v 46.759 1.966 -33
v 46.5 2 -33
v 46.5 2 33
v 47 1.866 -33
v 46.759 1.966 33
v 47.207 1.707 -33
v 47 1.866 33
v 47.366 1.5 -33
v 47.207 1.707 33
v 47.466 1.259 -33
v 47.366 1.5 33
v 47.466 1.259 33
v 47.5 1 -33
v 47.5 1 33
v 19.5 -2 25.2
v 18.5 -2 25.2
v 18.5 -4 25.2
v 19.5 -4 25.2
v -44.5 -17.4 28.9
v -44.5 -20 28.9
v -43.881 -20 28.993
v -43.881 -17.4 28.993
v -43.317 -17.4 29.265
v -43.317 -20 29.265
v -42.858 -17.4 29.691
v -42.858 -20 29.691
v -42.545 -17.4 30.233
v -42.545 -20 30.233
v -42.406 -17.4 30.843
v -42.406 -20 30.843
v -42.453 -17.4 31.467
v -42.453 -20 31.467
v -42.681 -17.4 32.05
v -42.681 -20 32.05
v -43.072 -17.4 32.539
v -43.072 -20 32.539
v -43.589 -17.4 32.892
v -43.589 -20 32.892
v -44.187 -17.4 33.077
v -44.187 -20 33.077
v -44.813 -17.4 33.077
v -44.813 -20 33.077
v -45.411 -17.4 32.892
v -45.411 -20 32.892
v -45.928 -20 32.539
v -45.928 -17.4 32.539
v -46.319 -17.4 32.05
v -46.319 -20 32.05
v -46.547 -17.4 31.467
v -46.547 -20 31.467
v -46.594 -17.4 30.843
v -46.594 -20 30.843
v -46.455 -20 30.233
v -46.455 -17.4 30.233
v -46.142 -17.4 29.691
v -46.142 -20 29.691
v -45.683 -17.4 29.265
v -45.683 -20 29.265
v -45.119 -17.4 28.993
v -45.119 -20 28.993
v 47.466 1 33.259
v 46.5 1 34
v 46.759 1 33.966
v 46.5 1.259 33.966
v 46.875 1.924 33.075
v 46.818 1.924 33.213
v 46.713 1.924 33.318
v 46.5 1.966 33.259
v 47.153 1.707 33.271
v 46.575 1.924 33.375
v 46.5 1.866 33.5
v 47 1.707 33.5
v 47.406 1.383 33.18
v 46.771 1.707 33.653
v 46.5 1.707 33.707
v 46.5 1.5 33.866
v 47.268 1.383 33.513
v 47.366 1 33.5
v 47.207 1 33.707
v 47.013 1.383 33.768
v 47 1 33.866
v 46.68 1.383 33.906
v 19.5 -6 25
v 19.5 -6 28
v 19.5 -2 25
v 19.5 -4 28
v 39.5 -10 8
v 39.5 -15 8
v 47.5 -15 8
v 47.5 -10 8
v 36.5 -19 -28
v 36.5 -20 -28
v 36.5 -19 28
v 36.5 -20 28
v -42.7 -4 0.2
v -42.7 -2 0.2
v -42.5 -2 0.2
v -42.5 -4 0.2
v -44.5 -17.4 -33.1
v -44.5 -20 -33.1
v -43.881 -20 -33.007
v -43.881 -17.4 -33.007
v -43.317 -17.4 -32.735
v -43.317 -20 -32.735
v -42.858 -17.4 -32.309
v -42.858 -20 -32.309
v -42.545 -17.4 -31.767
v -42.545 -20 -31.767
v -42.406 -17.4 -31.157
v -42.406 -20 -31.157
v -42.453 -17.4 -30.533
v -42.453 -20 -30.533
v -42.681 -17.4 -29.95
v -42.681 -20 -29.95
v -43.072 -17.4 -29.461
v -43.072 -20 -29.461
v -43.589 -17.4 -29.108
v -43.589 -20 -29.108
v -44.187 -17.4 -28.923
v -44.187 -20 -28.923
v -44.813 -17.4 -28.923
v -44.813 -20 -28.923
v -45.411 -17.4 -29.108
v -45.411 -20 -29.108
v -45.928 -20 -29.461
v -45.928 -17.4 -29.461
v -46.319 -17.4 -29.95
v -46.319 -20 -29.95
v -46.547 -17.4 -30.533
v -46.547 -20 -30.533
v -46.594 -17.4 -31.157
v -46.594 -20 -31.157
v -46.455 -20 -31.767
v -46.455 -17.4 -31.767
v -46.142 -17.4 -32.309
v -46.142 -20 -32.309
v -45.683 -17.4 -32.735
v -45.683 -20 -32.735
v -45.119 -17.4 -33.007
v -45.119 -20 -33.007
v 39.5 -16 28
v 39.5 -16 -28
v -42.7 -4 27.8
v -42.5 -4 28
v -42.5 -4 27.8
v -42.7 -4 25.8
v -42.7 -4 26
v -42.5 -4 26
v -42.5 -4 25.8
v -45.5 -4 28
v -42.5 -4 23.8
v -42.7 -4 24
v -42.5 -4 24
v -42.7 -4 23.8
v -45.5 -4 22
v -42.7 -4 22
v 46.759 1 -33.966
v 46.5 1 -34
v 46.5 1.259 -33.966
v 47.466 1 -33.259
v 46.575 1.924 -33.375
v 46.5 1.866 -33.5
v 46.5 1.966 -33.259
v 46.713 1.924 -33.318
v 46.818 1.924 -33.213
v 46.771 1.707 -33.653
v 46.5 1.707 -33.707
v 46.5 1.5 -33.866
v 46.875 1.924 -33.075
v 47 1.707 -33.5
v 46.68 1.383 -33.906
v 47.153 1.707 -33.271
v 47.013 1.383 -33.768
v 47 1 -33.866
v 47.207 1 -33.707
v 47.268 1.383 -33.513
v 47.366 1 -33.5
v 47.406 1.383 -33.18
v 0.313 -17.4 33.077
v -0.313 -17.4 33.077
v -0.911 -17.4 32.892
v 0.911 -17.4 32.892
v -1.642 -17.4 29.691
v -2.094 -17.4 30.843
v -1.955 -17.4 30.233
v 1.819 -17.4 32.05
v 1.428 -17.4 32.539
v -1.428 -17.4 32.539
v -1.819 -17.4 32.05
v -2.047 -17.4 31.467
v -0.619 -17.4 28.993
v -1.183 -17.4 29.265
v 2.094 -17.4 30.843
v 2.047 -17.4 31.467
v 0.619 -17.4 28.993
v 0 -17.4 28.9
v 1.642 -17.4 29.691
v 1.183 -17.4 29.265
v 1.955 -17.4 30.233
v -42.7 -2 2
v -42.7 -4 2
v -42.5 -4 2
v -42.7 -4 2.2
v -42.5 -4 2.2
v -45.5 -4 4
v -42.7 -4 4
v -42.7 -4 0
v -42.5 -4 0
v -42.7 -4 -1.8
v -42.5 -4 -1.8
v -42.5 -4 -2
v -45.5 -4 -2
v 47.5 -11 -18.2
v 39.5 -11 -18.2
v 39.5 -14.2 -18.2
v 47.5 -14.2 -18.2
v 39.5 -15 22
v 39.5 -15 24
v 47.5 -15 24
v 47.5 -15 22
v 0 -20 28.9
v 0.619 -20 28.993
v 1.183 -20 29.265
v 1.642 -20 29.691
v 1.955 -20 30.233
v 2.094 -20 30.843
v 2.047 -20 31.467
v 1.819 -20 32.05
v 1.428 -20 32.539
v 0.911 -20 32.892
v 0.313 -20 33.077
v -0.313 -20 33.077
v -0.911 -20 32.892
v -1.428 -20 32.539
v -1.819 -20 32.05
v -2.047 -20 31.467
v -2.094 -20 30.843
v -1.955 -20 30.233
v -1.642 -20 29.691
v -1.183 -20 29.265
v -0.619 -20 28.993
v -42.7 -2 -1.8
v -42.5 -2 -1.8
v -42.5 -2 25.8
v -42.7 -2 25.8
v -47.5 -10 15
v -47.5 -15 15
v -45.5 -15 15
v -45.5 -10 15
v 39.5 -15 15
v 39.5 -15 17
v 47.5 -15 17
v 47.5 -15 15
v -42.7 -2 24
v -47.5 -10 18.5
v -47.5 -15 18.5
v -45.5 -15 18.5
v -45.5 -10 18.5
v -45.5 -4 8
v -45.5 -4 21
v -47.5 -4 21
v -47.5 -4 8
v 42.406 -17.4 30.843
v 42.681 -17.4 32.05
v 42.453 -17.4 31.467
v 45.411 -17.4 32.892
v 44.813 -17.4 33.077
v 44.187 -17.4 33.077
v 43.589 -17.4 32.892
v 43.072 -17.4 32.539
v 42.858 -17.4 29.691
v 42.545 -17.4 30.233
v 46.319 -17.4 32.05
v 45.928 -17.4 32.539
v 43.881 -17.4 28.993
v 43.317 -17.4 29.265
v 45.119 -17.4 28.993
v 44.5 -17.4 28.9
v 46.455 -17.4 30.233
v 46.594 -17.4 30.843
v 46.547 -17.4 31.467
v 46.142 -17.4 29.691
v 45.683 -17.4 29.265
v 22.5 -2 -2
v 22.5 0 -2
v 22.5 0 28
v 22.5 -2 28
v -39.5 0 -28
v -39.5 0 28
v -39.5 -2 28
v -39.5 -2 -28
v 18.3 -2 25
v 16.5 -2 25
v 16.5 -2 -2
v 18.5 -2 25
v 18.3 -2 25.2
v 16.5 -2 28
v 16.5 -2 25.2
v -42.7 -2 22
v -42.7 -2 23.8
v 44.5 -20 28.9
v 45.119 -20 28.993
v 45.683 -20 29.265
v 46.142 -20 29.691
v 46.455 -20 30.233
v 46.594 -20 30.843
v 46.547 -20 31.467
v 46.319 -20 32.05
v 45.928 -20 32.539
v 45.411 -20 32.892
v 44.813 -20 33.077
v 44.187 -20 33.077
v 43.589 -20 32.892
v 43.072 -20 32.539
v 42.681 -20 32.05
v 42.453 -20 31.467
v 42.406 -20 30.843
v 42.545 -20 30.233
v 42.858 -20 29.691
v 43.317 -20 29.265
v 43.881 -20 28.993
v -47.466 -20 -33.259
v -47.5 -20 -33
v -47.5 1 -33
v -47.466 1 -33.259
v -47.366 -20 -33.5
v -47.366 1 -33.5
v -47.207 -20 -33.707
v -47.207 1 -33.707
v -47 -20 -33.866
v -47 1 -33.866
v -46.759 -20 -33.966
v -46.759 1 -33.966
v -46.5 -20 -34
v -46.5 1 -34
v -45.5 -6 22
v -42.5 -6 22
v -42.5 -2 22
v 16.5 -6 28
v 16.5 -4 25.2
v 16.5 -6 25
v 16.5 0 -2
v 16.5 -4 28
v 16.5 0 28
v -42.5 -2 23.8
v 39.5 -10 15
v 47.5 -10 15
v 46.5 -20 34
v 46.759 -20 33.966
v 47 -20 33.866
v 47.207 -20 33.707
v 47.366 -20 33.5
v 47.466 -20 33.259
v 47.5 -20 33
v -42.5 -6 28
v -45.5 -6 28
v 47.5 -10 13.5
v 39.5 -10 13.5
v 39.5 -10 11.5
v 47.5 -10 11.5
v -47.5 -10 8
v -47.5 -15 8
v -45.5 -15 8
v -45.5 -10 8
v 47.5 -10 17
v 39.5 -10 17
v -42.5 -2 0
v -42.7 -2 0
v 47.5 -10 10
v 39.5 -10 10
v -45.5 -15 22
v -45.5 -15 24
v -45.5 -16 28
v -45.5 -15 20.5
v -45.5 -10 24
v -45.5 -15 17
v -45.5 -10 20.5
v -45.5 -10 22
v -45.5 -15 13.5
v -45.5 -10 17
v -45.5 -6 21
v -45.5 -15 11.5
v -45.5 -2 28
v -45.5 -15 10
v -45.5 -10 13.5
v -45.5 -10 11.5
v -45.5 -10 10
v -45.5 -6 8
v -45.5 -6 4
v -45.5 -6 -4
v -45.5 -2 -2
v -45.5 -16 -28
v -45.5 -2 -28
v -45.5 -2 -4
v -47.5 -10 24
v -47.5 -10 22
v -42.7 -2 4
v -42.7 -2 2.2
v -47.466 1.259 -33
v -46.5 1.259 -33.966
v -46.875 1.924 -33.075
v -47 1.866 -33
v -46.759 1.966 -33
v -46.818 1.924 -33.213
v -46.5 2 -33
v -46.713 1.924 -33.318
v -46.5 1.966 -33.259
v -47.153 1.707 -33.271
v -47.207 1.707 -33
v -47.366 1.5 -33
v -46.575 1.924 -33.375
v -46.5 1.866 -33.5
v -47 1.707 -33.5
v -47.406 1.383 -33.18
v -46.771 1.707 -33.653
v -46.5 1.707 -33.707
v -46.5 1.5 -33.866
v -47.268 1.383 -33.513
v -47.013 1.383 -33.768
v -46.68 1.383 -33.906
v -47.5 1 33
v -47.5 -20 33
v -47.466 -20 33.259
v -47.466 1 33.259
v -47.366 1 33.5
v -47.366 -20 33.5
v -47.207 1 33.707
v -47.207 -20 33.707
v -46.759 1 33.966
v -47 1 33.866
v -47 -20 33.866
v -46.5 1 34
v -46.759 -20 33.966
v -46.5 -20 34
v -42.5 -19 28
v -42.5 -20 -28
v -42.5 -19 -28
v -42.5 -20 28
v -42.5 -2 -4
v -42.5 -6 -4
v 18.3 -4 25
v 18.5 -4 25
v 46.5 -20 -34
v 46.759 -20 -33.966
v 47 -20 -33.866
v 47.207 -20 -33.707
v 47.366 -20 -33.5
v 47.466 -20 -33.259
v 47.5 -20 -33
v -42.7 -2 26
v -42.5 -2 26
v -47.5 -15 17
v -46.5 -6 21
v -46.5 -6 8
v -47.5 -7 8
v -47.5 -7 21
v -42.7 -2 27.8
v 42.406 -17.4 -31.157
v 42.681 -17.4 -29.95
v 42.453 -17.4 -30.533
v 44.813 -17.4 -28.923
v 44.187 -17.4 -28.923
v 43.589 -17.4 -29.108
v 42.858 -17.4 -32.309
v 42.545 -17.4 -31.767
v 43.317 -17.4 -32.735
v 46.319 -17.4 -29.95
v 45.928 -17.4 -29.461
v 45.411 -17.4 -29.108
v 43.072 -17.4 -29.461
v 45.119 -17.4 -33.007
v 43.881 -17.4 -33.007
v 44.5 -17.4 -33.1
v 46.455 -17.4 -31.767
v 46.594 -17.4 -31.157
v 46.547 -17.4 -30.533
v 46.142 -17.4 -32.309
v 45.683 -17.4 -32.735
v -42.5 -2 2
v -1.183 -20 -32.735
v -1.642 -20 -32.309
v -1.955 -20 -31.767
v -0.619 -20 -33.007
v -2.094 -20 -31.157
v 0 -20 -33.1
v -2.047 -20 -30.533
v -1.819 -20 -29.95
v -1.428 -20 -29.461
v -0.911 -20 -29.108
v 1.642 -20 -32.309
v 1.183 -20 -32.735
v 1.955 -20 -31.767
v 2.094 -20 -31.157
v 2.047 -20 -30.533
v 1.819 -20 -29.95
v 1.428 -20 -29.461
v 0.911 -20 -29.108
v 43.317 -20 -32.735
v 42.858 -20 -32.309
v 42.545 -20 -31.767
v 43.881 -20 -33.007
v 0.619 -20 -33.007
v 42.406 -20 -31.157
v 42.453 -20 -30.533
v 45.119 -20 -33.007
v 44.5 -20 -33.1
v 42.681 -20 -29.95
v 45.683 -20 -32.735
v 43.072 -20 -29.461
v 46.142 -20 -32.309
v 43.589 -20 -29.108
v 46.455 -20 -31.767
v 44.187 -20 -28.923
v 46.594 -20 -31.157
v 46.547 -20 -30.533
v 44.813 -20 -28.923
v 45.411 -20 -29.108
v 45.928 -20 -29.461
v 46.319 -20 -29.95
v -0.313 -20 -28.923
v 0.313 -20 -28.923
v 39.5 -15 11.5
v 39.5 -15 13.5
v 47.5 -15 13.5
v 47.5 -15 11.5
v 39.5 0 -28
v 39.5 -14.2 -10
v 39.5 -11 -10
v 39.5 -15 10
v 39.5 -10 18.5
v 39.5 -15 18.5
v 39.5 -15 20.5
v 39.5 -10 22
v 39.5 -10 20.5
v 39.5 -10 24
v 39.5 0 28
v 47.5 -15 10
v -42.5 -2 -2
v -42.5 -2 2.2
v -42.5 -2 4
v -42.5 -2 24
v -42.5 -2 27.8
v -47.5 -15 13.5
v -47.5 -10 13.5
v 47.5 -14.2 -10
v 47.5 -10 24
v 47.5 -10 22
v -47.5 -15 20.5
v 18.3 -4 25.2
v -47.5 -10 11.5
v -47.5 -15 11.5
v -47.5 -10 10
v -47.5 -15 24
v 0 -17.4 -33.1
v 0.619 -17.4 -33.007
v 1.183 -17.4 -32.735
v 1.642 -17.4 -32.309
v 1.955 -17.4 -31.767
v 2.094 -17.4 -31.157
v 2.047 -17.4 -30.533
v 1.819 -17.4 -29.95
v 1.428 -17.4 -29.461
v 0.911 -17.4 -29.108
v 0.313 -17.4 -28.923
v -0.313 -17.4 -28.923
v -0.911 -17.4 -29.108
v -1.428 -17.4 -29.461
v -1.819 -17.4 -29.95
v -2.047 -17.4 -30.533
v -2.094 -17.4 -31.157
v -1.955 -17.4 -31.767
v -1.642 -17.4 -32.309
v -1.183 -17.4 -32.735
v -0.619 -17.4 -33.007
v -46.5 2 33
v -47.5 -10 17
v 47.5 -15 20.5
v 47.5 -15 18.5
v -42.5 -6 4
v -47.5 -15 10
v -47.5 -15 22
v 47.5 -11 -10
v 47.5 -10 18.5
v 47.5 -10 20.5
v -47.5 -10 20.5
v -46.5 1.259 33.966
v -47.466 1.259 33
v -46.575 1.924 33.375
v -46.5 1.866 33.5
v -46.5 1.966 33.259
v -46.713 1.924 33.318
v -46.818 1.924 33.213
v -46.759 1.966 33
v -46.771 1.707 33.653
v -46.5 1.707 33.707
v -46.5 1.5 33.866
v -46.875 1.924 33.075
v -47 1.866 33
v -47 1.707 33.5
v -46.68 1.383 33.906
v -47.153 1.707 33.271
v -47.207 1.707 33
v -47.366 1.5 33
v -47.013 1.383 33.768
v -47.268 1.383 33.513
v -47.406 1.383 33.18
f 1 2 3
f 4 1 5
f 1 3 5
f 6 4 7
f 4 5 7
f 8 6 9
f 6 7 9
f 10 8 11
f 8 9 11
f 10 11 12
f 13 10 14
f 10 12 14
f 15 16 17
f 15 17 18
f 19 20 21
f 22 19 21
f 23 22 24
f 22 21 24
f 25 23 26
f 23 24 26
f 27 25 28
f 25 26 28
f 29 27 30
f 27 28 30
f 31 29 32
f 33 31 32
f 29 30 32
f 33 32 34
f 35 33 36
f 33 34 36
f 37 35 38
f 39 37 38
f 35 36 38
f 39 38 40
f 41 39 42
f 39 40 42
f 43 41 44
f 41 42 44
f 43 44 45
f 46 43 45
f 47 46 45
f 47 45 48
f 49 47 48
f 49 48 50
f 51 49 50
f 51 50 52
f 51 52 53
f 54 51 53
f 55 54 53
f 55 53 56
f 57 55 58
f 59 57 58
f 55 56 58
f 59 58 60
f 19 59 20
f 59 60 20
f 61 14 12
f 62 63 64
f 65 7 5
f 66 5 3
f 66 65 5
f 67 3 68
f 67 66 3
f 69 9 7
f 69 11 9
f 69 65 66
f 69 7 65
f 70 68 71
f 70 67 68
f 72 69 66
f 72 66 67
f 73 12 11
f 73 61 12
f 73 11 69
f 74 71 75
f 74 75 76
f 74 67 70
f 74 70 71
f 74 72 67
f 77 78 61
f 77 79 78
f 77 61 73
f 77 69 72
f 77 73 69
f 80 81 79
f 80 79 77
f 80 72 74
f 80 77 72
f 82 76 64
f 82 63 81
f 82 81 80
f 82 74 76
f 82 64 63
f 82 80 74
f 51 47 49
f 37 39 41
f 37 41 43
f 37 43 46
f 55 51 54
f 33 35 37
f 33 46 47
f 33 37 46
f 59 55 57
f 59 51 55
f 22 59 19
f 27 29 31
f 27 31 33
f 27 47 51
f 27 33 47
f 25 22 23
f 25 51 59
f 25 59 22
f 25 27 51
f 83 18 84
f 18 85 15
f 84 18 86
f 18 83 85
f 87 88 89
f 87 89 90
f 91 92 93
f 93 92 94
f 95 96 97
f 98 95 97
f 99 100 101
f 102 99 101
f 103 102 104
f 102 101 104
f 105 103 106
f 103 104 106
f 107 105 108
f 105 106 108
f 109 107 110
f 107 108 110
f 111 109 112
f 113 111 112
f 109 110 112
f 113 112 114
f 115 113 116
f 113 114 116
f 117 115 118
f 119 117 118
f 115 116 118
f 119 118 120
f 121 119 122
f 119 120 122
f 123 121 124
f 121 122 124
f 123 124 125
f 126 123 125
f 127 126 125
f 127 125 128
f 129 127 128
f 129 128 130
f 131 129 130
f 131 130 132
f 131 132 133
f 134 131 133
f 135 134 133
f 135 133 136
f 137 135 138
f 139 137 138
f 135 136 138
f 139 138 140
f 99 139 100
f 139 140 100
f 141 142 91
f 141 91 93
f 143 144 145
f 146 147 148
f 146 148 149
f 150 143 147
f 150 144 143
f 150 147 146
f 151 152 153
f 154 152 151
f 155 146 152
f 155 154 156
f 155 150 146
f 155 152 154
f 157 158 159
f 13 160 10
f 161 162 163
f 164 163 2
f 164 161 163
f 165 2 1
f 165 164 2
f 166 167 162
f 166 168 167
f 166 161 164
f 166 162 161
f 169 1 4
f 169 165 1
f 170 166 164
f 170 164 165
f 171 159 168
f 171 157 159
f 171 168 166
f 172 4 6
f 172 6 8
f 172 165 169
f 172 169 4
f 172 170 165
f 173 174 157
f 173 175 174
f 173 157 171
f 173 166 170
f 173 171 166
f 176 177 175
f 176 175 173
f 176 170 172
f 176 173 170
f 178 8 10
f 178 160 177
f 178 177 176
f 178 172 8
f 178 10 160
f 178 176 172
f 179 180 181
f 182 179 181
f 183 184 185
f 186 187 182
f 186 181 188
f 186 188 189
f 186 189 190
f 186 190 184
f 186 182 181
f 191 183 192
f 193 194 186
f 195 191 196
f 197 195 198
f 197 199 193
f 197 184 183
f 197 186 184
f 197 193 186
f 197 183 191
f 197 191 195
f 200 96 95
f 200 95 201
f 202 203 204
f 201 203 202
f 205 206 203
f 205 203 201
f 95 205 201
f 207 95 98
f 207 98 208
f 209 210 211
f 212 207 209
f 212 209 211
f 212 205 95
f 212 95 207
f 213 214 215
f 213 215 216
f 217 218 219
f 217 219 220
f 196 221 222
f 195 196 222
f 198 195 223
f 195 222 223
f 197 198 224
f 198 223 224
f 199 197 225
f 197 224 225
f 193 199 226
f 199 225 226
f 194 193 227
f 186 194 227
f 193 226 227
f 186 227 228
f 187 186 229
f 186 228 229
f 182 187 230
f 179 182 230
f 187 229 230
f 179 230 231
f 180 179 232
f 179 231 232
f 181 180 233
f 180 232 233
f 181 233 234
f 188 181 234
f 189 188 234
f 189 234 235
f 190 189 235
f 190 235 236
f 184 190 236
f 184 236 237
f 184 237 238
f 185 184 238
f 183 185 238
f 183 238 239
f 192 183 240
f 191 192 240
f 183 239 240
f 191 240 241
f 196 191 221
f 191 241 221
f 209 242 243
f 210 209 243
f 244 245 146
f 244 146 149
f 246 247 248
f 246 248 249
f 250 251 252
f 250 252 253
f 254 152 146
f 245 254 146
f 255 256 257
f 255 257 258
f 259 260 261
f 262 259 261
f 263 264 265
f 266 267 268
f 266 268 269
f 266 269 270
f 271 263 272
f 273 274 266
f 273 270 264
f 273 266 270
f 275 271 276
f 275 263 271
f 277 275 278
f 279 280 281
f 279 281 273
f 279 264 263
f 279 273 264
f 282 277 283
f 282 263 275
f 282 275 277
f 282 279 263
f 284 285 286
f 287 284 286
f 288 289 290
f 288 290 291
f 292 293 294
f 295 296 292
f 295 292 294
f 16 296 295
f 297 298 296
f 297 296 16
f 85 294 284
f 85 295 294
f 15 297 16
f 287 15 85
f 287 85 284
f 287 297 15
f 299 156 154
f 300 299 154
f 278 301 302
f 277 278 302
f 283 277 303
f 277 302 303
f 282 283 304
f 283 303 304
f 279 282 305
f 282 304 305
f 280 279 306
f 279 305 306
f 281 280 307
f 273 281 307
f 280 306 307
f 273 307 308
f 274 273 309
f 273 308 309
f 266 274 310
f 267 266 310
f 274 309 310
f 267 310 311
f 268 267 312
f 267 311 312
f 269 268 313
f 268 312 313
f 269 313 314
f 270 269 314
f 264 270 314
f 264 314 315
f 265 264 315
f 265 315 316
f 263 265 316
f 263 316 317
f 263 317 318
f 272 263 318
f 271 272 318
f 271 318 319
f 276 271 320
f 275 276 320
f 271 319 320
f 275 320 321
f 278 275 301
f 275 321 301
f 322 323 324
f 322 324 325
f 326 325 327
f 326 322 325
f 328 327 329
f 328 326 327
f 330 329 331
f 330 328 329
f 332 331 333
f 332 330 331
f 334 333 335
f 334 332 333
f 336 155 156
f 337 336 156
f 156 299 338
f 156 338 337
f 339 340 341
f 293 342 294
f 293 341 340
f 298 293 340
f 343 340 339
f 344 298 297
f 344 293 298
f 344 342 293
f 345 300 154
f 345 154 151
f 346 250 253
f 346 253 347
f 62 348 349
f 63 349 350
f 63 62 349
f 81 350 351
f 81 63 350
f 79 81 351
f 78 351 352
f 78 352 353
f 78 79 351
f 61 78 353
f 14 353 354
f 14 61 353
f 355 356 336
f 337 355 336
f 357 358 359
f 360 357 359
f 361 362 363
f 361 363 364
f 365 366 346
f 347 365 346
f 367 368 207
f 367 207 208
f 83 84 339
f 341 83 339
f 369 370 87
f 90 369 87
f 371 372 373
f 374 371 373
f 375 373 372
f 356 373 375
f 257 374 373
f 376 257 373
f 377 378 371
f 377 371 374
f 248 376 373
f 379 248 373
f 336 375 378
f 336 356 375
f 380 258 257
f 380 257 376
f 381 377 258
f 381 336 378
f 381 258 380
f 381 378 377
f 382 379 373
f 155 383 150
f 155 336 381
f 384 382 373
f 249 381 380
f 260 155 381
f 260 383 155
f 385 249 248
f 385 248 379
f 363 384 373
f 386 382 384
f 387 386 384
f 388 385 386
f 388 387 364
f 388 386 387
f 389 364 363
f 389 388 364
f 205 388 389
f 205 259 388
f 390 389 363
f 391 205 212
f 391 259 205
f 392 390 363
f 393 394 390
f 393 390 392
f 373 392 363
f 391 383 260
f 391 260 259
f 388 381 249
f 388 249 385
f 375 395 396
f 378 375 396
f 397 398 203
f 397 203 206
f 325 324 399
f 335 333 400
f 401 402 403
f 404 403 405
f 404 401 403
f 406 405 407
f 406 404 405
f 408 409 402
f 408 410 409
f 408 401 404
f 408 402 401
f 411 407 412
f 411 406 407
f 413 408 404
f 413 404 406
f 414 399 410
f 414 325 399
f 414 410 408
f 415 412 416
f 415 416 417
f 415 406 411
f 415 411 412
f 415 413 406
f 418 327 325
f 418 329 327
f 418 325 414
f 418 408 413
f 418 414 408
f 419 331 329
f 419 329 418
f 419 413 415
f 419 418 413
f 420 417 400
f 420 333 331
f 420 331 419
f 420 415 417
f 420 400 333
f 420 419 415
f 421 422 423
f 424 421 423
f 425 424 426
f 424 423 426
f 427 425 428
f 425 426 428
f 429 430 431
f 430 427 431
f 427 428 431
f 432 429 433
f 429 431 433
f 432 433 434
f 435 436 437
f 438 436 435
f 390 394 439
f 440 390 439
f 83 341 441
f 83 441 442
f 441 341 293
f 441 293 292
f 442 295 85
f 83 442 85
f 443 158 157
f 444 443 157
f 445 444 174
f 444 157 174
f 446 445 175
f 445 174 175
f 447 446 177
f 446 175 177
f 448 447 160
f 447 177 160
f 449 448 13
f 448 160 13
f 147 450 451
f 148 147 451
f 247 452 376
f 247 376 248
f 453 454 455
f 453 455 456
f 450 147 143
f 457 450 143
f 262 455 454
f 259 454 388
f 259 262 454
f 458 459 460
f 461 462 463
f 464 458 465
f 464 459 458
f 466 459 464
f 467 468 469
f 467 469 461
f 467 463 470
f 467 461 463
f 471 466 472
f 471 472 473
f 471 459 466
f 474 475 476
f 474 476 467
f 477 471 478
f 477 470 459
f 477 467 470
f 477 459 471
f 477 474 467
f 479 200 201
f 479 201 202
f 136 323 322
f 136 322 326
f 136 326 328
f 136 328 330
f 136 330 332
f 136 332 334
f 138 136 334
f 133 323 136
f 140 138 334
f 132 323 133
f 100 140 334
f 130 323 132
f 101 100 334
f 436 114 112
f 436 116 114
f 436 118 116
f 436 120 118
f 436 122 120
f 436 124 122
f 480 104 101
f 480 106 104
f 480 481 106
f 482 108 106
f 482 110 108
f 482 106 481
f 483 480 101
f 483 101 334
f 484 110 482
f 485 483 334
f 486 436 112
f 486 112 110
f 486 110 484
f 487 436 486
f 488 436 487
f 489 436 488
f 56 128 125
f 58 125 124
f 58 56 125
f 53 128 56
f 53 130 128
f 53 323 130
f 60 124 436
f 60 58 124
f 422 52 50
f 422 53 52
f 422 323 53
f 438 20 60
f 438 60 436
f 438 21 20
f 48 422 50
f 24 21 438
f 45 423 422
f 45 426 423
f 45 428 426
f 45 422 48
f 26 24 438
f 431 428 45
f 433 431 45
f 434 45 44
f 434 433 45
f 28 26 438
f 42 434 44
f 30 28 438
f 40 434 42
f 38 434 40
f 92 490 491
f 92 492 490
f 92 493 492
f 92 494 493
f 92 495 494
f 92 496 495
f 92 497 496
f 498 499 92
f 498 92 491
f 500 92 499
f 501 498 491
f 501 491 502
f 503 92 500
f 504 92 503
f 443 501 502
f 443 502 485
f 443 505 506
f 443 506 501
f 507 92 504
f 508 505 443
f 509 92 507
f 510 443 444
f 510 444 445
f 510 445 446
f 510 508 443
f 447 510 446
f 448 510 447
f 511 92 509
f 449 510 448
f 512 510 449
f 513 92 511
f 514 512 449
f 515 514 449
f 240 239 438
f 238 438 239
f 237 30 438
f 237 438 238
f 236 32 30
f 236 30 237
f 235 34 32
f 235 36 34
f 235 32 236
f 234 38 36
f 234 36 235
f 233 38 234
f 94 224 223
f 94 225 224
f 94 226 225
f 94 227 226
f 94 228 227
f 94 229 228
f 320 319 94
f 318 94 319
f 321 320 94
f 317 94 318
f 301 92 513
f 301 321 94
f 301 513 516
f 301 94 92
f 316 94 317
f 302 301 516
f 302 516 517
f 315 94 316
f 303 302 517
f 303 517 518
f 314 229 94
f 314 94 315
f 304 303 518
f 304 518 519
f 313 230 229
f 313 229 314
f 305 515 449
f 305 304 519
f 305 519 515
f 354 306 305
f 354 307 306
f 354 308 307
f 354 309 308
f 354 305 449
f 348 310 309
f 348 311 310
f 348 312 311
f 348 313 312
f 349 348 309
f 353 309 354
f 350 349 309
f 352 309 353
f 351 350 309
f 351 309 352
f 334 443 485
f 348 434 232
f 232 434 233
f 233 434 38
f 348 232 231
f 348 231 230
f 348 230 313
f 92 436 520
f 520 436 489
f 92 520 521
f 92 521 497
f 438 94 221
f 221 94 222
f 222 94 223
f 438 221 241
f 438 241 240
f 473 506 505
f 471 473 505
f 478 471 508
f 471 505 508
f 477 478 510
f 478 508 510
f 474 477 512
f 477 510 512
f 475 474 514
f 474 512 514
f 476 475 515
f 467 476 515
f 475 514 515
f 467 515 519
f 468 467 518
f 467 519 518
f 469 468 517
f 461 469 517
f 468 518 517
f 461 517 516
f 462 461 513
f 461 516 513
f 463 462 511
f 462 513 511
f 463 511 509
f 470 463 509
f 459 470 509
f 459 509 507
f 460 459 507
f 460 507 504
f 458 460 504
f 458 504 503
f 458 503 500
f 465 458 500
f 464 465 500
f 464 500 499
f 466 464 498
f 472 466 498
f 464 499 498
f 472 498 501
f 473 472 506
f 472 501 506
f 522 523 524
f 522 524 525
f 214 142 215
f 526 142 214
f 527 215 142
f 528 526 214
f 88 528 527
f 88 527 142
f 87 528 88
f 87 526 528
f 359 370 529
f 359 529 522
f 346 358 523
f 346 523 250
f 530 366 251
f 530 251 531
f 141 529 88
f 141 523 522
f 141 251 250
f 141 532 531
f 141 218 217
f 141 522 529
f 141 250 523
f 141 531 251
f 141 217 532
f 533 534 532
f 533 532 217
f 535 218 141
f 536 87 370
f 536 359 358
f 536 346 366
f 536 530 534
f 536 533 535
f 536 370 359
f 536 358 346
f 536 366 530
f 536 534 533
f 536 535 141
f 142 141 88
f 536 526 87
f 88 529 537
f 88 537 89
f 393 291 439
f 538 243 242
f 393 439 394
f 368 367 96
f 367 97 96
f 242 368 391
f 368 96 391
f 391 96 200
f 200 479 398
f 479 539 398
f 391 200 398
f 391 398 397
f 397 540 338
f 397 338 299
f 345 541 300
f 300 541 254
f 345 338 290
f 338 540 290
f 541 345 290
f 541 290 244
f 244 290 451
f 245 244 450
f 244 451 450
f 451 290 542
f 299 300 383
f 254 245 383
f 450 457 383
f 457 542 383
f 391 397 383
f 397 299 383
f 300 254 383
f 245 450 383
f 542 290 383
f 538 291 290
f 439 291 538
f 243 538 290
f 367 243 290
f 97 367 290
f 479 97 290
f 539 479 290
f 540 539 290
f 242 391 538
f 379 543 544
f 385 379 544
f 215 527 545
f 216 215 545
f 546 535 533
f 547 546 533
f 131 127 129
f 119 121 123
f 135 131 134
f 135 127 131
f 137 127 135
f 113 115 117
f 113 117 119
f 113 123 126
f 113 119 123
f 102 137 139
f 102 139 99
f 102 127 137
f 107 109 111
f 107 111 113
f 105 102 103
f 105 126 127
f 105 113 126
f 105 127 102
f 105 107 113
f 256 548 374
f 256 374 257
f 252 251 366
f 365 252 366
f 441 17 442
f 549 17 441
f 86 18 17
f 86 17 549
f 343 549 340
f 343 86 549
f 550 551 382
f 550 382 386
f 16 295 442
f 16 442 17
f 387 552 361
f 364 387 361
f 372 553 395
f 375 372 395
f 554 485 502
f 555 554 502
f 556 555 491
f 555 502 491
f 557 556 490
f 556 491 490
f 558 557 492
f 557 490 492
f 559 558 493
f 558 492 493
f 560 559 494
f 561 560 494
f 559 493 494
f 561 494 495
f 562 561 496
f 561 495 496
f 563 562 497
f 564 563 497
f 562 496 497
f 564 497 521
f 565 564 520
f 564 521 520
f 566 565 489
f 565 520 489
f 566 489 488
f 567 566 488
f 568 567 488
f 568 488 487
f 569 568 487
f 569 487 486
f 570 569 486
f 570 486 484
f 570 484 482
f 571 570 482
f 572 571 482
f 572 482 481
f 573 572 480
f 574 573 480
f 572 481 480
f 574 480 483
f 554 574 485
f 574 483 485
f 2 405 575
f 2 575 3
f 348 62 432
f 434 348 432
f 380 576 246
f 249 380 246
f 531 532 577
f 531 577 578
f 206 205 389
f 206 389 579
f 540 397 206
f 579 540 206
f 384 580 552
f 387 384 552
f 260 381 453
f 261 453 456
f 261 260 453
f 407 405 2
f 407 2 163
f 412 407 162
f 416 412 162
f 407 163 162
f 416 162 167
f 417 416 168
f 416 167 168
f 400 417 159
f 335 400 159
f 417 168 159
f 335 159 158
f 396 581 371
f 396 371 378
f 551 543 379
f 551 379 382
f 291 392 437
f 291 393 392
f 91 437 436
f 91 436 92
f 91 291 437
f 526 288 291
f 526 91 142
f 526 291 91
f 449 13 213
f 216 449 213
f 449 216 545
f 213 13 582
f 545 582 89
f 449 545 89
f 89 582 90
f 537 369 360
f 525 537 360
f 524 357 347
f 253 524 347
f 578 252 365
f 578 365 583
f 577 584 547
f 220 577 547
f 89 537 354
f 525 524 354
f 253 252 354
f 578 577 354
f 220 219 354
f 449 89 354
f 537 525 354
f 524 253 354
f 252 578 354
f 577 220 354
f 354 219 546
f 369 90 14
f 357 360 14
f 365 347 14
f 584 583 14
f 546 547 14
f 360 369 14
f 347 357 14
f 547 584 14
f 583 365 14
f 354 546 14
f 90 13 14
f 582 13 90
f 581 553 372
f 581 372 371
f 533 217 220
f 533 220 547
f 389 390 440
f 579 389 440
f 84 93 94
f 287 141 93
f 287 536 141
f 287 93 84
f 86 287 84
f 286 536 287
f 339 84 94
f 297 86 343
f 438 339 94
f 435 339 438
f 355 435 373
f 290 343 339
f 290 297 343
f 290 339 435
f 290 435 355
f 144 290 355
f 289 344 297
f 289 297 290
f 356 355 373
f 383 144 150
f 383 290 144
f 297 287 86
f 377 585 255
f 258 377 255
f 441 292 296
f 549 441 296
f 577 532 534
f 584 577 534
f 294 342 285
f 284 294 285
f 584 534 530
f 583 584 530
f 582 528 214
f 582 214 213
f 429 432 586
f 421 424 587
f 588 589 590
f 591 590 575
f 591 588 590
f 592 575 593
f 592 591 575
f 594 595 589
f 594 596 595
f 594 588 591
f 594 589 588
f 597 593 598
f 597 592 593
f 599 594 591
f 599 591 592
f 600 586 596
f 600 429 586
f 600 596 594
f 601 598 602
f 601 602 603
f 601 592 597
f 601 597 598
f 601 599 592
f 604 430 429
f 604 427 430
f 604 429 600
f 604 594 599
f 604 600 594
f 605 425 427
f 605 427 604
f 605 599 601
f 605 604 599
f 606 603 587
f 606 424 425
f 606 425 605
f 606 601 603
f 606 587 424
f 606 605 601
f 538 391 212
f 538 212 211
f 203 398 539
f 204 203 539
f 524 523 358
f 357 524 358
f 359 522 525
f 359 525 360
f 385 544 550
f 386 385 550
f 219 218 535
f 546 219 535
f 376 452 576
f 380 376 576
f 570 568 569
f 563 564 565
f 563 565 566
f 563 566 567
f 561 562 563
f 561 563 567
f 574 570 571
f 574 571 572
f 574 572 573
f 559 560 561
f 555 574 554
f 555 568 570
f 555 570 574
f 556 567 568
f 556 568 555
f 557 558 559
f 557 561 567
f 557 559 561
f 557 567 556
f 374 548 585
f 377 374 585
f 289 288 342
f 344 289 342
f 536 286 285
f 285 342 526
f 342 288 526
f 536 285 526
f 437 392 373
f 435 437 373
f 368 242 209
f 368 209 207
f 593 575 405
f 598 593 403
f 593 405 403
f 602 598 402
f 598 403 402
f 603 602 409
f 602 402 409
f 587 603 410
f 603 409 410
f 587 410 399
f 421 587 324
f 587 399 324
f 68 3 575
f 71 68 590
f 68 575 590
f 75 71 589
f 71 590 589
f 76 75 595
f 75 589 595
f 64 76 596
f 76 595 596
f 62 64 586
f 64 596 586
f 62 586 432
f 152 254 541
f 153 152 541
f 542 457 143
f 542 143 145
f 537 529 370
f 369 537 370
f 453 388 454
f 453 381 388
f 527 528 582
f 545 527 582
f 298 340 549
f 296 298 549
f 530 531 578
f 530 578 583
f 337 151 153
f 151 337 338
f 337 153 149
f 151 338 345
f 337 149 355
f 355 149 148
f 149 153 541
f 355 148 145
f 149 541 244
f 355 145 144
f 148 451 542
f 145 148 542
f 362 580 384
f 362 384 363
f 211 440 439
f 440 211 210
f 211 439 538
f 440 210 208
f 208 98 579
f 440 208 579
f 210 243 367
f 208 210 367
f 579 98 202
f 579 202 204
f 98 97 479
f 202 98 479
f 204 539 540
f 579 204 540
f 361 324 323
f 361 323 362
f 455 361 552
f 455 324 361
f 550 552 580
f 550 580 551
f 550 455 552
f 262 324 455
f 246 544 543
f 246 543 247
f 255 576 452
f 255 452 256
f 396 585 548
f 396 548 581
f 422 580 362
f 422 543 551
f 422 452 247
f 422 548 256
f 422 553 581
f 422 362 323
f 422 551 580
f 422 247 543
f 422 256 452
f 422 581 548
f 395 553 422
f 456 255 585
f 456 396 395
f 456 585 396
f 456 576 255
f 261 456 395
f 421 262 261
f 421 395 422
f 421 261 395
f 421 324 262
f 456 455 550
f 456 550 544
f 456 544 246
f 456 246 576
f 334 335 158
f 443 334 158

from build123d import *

# Parameters (mm, degrees)
SKETCH_1_W               = 95
SKETCH_1_H               = 68
EXTRUDE_1_DEPTH          = 2
EXTRUDE_2_DEPTH          = 2
EXTRUDE_3_DEPTH          = 2
EXTRUDE_4_DEPTH          = 2
EXTRUDE_5_DEPTH          = 14
SKETCH_7_W               = 6
SKETCH_7_H               = 2
EXTRUDE_6_DEPTH          = 3
SKETCH_8_W               = 3
SKETCH_8_H               = 2
EXTRUDE_7_DEPTH          = 4
SKETCH_9_W               = 0.2
SKETCH_9_H               = 1.8
EXTRUDE_8_DEPTH          = 2
SKETCH_13_W              = 3
SKETCH_13_H              = 56
EXTRUDE_10_DEPTH         = 4
CHAMFER_6_SIZE           = 3
EXTRUDE_11_DEPTH         = 2
SKETCH_15_W              = 3
SKETCH_15_H              = 2
EXTRUDE_12_DEPTH         = 3
SKETCH_16_W              = 1.8
SKETCH_16_H              = 0.2
SKETCH_16_W_2            = 1
EXTRUDE_13_DEPTH         = 2
SKETCH_17_W              = 8
SKETCH_17_H              = 56
EXTRUDE_15_DEPTH         = 11
SKETCH_18_W              = 8
SKETCH_18_H              = 38
SKETCH_18_H_2            = 9.8
EXTRUDE_16_DEPTH         = 3.2
SKETCH_19_W              = 8
SKETCH_19_H              = 56
EXTRUDE_17_DEPTH         = 5.8
SKETCH_20_W              = 3
SKETCH_20_H              = 56
EXTRUDE_18_DEPTH         = 4
CHAMFER_7_SIZE           = 3
CHAMFER_8_SIZE           = 1
SKETCH_22_R              = 2.1
CUT_EXTRUDE_1_DEPTH      = 2.6
CUT_EXTRUDE_2_DEPTH      = 103.863987867
CUT_EXTRUDE_2_DEPTH_BACK = 103.863987867
SKETCH_23_W              = 2
SKETCH_23_H              = 5
FILLET_1_R               = 1
FILLET_2_R               = 1


with BuildPart() as part:
    # 草图1 → 凸台-拉伸1 (new body)
    with BuildSketch(Plane(origin=(0, 0, 0), x_dir=(1, 0, 0), z_dir=(0, 1, 0))):
        Rectangle(SKETCH_1_W, SKETCH_1_H)
    extrude(amount=EXTRUDE_1_DEPTH)

    # 草图3 → 凸台-拉伸2 (add)
    with BuildSketch(Plane.XZ):
        Polygon((-47.5, 34), (-39.5, 34), (47.5, 34), (47.5, 28), (-39.5, 28), (-39.5, -28), (47.5, -28), (47.5, -34), (-39.5, -34), (-47.5, -34), align=None)
    extrude(amount=EXTRUDE_2_DEPTH)

    # 草图4 → 凸台-拉伸3 (add)
    with BuildSketch(Plane.XZ.offset(2)):
        Polygon((-47.5, 34), (47.5, 34), (47.5, 28), (-45.5, 28), (-45.5, -28), (47.5, -28), (47.5, -34), (-47.5, -34), (-47.5, -28), (-47.5, 28), align=None)
    extrude(amount=EXTRUDE_3_DEPTH)

    # 草图5 → 凸台-拉伸4 (add)
    with BuildSketch(Plane.XZ.offset(4)):
        Polygon((-47.5, 34), (-45.5, 34), (47.5, 34), (47.5, 28), (-45.5, 28), (-45.5, 21), (-47.5, 21), align=None)
        Polygon((-47.5, 8), (-45.5, 8), (-45.5, -28), (47.5, -28), (47.5, -34), (-45.5, -34), (-47.5, -34), align=None)
    extrude(amount=EXTRUDE_4_DEPTH)

    # 草图6 → 凸台-拉伸5 (add)
    with BuildSketch(Plane.XZ.offset(6)):
        Polygon((-47.5, 34), (-45.5, 34), (47.5, 34), (47.5, 28), (-45.5, 28), (-45.5, -28), (47.5, -28), (47.5, -34), (-45.5, -34), (-47.5, -34), align=None)
    extrude(amount=EXTRUDE_5_DEPTH)

    # 草图7 → 凸台-拉伸6 (add)
    with BuildSketch(Plane(origin=(-45.5, 0, 0), x_dir=(0, 0, -1), z_dir=(1, 0, 0))):
        with Locations((-25, -5)):
            Rectangle(SKETCH_7_W, SKETCH_7_H)
        with Locations((-1, -5)):
            Rectangle(SKETCH_7_W, SKETCH_7_H)
    extrude(amount=EXTRUDE_6_DEPTH)

    # 草图8 → 凸台-拉伸7 (add)
    with BuildSketch(Plane.XZ.offset(2)):
        with Locations((-44, -3)):
            Rectangle(SKETCH_8_W, SKETCH_8_H)
    extrude(amount=EXTRUDE_7_DEPTH)

    # 草图9 → 凸台-拉伸8 (add)
    with BuildSketch(Plane.XZ.offset(2)):
        with Locations((-42.6, 22.9)):
            Rectangle(SKETCH_9_W, SKETCH_9_H)
        with Locations((-42.6, 24.9)):
            Rectangle(SKETCH_9_W, SKETCH_9_H)
        with Locations((-42.6, 26.9)):
            Rectangle(SKETCH_9_W, SKETCH_9_H)
        with Locations((-42.6, 3.1)):
            Rectangle(SKETCH_9_W, SKETCH_9_H)
        with Locations((-42.6, 1.1)):
            Rectangle(SKETCH_9_W, SKETCH_9_H)
        with Locations((-42.6, -0.9)):
            Rectangle(SKETCH_9_W, SKETCH_9_H)
    extrude(amount=EXTRUDE_8_DEPTH)

    # 草图13 → 凸台-拉伸10 (add)
    with BuildSketch(Plane.XZ.offset(20)):
        with Locations((-44, 0)):
            Rectangle(SKETCH_13_W, SKETCH_13_H)
    extrude(amount=-EXTRUDE_10_DEPTH)

    # 倒角6
    chamfer_6_edges = [part.edges().sort_by_distance(p)[0] for p in [
        (-42.5, -16, 0),
    ]]
    chamfer(chamfer_6_edges, length=CHAMFER_6_SIZE - 0.0001)  # a hair under: the kernel refuses the full size

    # 草图14 → 凸台-拉伸11 (add)
    with BuildSketch(Plane.XZ):
        Polygon((16.5, 28), (16.5, -2), (19.5, -2), (22.5, -2), (22.5, 28), (19.5, 28), align=None)
    extrude(amount=EXTRUDE_11_DEPTH)

    # 草图15 → 凸台-拉伸12 (add)
    with BuildSketch(Plane(origin=(0, 0, 28), x_dir=(-1, 0, 0), z_dir=(0, 0, -1))):
        with Locations((-18, -5)):
            Rectangle(SKETCH_15_W, SKETCH_15_H)
    extrude(amount=EXTRUDE_12_DEPTH)

    # 草图16 → 凸台-拉伸13 (add)
    with BuildSketch(Plane.XZ.offset(2)):
        with Locations((17.4, 25.1)):
            Rectangle(SKETCH_16_W, SKETCH_16_H)
        with Locations((19, 25.1)):
            Rectangle(SKETCH_16_W_2, SKETCH_16_H)
    extrude(amount=EXTRUDE_13_DEPTH)

    # 草图17 → 凸台-拉伸15 (add)
    with BuildSketch(Plane.XZ):
        with Locations((43.5, 0)):
            Rectangle(SKETCH_17_W, SKETCH_17_H)
    extrude(amount=EXTRUDE_15_DEPTH)

    # 草图18 → 凸台-拉伸16 (add)
    with BuildSketch(Plane.XZ.offset(11)):
        with Locations((43.5, 9)):
            Rectangle(SKETCH_18_W, SKETCH_18_H)
        with Locations((43.5, -23.1)):
            Rectangle(SKETCH_18_W, SKETCH_18_H_2)
    extrude(amount=EXTRUDE_16_DEPTH)

    # 草图19 → 凸台-拉伸17 (add)
    with BuildSketch(Plane.XZ.offset(14.2)):
        with Locations((43.5, 0)):
            Rectangle(SKETCH_19_W, SKETCH_19_H)
    extrude(amount=EXTRUDE_17_DEPTH)

    # 草图20 → 凸台-拉伸18 (add)
    with BuildSketch(Plane.XZ.offset(20)):
        with Locations((38, 0)):
            Rectangle(SKETCH_20_W, SKETCH_20_H)
    extrude(amount=-EXTRUDE_18_DEPTH)

    # 倒角7
    chamfer_7_edges = [part.edges().sort_by_distance(p)[0] for p in [
        (36.5, -16, 0),
    ]]
    chamfer(chamfer_7_edges, length=CHAMFER_7_SIZE - 0.0001)  # a hair under: the kernel refuses the full size

    # 倒角8
    chamfer_8_edges = [part.edges().sort_by_distance(p)[0] for p in [
        (-47.5, -6, 14.5),
    ]]
    chamfer(chamfer_8_edges, length=CHAMFER_8_SIZE)

    # 草图22 → 切除-拉伸1 (cut)
    with BuildSketch(Plane.XZ.offset(20)):
        with Locations(Location((-44.5, 31, 0), (0, 0, 270))):
            Circle(SKETCH_22_R)
        with Locations(Location((0, 31, 0), (0, 0, 270))):
            Circle(SKETCH_22_R)
        with Locations(Location((44.5, 31, 0), (0, 0, 270))):
            Circle(SKETCH_22_R)
        with Locations(Location((44.5, -31, 0), (0, 0, 270))):
            Circle(SKETCH_22_R)
        with Locations(Location((0, -31, 0), (0, 0, 270))):
            Circle(SKETCH_22_R)
        with Locations(Location((-44.5, -31, 0), (0, 0, 270))):
            Circle(SKETCH_22_R)
    extrude(amount=-CUT_EXTRUDE_1_DEPTH, mode=Mode.SUBTRACT)

    # 草图23 → 切除-拉伸2 (cut, two sides: drawn at the far end of the back side and taken through both)
    with BuildSketch(Plane(origin=(47.5, 0, 0), x_dir=(0, 0, -1), z_dir=(1, 0, 0)).offset(-CUT_EXTRUDE_2_DEPTH_BACK)):
        with Locations((-23, -12.5)):
            Rectangle(SKETCH_23_W, SKETCH_23_H)
        with Locations((-19.5, -12.5)):
            Rectangle(SKETCH_23_W, SKETCH_23_H)
        with Locations((-16, -12.5)):
            Rectangle(SKETCH_23_W, SKETCH_23_H)
        with Locations((-12.5, -12.5)):
            Rectangle(SKETCH_23_W, SKETCH_23_H)
        with Locations((-9, -12.5)):
            Rectangle(SKETCH_23_W, SKETCH_23_H)
    extrude(amount=CUT_EXTRUDE_2_DEPTH + CUT_EXTRUDE_2_DEPTH_BACK, mode=Mode.SUBTRACT)

    # 圆角1
    fillet_1_edges = [part.edges().sort_by_distance(p)[0] for p in [
        (-47.5, -9, -34),
        (47.5, -9, -34),
        (47.5, -9, 34),
        (-47.5, -9, 34),
    ]]
    fillet(fillet_1_edges, radius=FILLET_1_R)

    # 圆角2
    fillet_2_edges = [part.edges().sort_by_distance(p)[0] for p in [
        (0, 2, -34),
        (47.5, 2, 0),
        (-47.5, 2, 0),
        (0, 2, 34),
        (-47.207106781, 2, 33.707106781),
        (-47.207106781, 2, -33.707106781),
        (47.207106781, 2, 33.707106781),
        (47.207106781, 2, -33.707106781),
    ]]
    fillet(fillet_2_edges, radius=FILLET_2_R)


solid = part.part
